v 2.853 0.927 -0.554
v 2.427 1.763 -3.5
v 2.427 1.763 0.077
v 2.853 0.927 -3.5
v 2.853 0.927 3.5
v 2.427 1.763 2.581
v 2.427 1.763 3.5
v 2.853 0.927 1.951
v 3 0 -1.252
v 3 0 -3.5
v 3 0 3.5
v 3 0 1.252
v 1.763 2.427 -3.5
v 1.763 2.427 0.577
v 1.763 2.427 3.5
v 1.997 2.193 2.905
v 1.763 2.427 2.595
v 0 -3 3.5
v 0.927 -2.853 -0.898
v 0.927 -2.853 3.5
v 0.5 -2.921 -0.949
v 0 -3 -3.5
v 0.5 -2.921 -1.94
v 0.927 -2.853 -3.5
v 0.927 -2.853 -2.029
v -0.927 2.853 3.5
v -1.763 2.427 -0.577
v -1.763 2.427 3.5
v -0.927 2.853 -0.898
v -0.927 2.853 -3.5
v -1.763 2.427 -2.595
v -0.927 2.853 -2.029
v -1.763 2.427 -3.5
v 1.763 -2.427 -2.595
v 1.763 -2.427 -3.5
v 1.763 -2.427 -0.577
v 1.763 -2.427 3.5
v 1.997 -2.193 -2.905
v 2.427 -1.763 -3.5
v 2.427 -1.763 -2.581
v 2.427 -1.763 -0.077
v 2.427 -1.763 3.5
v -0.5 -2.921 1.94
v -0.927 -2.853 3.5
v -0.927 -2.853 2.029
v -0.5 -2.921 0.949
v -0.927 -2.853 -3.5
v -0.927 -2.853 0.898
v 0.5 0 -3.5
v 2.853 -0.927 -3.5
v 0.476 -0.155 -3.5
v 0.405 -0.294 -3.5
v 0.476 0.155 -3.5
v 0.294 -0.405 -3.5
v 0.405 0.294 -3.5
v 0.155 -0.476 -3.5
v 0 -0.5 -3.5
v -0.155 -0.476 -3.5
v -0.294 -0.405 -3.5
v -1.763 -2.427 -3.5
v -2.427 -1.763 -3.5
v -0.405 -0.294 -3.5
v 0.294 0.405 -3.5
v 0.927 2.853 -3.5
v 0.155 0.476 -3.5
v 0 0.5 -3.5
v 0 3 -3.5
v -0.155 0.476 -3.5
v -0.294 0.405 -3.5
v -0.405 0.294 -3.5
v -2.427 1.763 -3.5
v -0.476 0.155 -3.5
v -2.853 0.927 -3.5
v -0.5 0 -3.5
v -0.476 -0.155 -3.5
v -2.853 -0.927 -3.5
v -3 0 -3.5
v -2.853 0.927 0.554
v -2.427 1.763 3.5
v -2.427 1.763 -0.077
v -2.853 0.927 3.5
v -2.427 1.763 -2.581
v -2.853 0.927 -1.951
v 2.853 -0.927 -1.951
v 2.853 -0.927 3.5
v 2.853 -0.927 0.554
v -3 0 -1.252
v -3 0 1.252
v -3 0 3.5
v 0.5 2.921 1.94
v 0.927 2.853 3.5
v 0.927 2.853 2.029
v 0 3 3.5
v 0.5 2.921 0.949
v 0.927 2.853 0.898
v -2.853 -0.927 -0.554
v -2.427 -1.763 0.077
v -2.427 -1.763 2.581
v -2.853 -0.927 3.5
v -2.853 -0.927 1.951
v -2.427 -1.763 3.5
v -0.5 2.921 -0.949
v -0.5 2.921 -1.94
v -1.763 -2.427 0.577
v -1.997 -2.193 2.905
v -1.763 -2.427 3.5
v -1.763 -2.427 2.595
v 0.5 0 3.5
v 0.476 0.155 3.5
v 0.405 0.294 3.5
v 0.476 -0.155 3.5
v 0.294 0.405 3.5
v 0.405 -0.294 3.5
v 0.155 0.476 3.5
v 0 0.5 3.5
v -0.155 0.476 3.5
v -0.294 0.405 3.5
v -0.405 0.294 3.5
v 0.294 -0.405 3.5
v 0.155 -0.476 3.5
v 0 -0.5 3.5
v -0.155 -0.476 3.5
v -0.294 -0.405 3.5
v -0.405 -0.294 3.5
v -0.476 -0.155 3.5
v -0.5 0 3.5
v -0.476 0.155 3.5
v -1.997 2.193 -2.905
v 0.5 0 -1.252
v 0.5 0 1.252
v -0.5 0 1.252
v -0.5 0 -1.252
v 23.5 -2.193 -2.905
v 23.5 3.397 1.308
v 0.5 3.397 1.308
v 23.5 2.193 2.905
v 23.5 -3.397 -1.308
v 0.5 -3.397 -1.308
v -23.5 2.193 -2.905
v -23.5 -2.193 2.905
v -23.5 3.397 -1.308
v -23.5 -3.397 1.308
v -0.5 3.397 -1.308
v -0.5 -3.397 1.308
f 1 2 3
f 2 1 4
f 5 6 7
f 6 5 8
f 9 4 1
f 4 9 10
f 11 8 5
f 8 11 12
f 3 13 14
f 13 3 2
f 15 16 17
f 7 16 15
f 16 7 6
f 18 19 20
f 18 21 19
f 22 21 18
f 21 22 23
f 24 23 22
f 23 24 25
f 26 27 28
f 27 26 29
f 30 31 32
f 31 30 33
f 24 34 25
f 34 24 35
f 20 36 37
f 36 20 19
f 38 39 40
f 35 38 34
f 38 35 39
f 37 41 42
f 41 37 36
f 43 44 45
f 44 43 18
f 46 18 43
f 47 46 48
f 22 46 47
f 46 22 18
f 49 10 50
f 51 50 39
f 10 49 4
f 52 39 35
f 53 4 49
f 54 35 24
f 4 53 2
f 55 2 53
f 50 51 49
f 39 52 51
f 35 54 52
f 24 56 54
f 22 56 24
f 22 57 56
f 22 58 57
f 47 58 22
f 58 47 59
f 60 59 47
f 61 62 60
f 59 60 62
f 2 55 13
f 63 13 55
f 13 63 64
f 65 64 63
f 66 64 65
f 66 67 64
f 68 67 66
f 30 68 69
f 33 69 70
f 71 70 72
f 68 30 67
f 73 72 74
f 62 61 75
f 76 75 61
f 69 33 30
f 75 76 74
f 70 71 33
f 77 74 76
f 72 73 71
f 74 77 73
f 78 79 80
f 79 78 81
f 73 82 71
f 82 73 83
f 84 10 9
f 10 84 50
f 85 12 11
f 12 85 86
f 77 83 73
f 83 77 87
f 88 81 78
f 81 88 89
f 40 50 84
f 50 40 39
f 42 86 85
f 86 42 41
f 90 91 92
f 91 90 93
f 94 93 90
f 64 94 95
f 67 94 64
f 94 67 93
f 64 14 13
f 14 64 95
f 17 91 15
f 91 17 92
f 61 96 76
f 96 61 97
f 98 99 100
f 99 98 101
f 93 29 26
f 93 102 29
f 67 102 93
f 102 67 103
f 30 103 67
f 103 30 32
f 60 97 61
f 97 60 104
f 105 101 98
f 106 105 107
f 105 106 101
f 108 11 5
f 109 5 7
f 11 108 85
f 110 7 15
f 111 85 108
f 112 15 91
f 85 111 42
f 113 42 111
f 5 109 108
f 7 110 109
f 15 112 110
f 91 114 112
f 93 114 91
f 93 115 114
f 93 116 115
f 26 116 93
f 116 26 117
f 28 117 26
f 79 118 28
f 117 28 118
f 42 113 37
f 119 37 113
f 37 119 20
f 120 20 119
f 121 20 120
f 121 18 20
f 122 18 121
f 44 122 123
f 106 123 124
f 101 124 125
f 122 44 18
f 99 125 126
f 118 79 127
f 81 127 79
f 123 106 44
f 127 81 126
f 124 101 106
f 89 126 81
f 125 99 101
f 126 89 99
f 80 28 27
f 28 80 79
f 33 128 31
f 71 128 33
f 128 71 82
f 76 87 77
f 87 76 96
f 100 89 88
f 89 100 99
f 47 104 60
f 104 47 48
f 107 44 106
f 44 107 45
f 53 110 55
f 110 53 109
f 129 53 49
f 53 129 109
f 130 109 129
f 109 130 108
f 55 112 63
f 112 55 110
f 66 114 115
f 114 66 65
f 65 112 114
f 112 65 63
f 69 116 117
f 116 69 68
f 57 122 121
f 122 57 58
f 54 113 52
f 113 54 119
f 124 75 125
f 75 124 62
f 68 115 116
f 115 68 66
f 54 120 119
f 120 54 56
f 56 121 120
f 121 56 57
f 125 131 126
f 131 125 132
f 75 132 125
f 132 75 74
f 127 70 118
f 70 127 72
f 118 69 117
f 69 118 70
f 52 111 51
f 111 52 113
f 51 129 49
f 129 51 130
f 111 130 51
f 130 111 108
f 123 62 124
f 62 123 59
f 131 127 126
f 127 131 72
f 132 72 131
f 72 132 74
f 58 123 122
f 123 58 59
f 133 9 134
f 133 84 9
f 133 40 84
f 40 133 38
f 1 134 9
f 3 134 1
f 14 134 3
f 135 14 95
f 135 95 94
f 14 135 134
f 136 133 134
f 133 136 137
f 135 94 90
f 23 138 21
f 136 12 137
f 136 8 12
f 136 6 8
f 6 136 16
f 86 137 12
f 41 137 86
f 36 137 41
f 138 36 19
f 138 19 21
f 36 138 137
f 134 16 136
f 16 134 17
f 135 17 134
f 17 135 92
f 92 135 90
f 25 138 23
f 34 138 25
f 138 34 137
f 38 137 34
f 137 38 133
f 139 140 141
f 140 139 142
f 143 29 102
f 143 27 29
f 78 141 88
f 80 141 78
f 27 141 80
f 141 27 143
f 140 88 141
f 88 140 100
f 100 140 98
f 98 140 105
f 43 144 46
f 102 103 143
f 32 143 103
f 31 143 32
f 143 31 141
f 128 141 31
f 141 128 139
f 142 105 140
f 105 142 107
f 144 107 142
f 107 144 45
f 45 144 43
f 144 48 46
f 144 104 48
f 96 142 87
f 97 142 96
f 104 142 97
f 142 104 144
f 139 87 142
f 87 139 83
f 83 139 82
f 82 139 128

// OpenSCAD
$fn = 20;     // Team.Mu.Captain@gmail.com

// Globes.
NumberOfBlades= 2;
HeightOfBlade = 7;
BladeThickness= 2;
BladeLength   = 23;
BladeXoffset  = 0;
BladeYoffset  = 0;
Pitch         = 37; // give a negative if you want inverted.
HeightOfShaft = 7;
ShaftHoleSize = .5;
ShaftCore     = 3;

// sub menu for smoothing
Smooth        = false;  // This distorts everything a
SmoothR       = .4;    // little, when set to true.
SmoothH       = .5;   // Probably should replace the whole thing,
                        // if you want prettier blades.
// sub menu for cap
Cap           = false;
CapDiameter   = ShaftCore;
CapPosition   = HeightOfShaft;

// sub menu for ring
Ring          = false; // There seems to be a glitch in the viewer
RingDistance  = BladeLength; // at certain angles/distances
RingThickness = 1;    // when this is set to true.

union(){
if(Ring){  // this is the ring
translate([0,0,0]){
difference(){
cylinder(h=HeightOfShaft, r1=(RingDistance+RingThickness), r2=(RingDistance+RingThickness), center=true);
cylinder(h=HeightOfShaft+500, r1=RingDistance, r2=RingDistance, center=true);
}}}

if(Cap){  // this is the Cap
translate([0,0,CapPosition*.5])
difference(){
sphere(CapDiameter);
rotate([0,180,0])
translate([0,0,CapPosition*.5])
cylinder(h=CapDiameter+1, r1=ShaftHoleSize, r2=ShaftHoleSize, center=true);
}}

difference(){ // this is the Shaft
cylinder(h=HeightOfShaft, r1=ShaftCore, r2=ShaftCore, center=true);
cylinder(h=500+HeightOfShaft, r1=ShaftHoleSize, r2=ShaftHoleSize, center=true);
}

for(i=[0:NumberOfBlades]){  // this is the Blade
rotate([0,0,i*(360/NumberOfBlades)])
rotate([Pitch,0,0])
translate([ShaftHoleSize,BladeXoffset,BladeYoffset])
rotate([0,90,0])
translate([-.5*BladeThickness,-.5*HeightOfBlade,0]){
    if(Smooth){   // this is the Smoothing or Not.
        minkowski(){
            cube([BladeThickness,HeightOfBlade,BladeLength]);
            cylinder(r=SmoothR,h=SmoothH);
        }
    }
    else
        cube([BladeThickness,HeightOfBlade,BladeLength]);
}}}
